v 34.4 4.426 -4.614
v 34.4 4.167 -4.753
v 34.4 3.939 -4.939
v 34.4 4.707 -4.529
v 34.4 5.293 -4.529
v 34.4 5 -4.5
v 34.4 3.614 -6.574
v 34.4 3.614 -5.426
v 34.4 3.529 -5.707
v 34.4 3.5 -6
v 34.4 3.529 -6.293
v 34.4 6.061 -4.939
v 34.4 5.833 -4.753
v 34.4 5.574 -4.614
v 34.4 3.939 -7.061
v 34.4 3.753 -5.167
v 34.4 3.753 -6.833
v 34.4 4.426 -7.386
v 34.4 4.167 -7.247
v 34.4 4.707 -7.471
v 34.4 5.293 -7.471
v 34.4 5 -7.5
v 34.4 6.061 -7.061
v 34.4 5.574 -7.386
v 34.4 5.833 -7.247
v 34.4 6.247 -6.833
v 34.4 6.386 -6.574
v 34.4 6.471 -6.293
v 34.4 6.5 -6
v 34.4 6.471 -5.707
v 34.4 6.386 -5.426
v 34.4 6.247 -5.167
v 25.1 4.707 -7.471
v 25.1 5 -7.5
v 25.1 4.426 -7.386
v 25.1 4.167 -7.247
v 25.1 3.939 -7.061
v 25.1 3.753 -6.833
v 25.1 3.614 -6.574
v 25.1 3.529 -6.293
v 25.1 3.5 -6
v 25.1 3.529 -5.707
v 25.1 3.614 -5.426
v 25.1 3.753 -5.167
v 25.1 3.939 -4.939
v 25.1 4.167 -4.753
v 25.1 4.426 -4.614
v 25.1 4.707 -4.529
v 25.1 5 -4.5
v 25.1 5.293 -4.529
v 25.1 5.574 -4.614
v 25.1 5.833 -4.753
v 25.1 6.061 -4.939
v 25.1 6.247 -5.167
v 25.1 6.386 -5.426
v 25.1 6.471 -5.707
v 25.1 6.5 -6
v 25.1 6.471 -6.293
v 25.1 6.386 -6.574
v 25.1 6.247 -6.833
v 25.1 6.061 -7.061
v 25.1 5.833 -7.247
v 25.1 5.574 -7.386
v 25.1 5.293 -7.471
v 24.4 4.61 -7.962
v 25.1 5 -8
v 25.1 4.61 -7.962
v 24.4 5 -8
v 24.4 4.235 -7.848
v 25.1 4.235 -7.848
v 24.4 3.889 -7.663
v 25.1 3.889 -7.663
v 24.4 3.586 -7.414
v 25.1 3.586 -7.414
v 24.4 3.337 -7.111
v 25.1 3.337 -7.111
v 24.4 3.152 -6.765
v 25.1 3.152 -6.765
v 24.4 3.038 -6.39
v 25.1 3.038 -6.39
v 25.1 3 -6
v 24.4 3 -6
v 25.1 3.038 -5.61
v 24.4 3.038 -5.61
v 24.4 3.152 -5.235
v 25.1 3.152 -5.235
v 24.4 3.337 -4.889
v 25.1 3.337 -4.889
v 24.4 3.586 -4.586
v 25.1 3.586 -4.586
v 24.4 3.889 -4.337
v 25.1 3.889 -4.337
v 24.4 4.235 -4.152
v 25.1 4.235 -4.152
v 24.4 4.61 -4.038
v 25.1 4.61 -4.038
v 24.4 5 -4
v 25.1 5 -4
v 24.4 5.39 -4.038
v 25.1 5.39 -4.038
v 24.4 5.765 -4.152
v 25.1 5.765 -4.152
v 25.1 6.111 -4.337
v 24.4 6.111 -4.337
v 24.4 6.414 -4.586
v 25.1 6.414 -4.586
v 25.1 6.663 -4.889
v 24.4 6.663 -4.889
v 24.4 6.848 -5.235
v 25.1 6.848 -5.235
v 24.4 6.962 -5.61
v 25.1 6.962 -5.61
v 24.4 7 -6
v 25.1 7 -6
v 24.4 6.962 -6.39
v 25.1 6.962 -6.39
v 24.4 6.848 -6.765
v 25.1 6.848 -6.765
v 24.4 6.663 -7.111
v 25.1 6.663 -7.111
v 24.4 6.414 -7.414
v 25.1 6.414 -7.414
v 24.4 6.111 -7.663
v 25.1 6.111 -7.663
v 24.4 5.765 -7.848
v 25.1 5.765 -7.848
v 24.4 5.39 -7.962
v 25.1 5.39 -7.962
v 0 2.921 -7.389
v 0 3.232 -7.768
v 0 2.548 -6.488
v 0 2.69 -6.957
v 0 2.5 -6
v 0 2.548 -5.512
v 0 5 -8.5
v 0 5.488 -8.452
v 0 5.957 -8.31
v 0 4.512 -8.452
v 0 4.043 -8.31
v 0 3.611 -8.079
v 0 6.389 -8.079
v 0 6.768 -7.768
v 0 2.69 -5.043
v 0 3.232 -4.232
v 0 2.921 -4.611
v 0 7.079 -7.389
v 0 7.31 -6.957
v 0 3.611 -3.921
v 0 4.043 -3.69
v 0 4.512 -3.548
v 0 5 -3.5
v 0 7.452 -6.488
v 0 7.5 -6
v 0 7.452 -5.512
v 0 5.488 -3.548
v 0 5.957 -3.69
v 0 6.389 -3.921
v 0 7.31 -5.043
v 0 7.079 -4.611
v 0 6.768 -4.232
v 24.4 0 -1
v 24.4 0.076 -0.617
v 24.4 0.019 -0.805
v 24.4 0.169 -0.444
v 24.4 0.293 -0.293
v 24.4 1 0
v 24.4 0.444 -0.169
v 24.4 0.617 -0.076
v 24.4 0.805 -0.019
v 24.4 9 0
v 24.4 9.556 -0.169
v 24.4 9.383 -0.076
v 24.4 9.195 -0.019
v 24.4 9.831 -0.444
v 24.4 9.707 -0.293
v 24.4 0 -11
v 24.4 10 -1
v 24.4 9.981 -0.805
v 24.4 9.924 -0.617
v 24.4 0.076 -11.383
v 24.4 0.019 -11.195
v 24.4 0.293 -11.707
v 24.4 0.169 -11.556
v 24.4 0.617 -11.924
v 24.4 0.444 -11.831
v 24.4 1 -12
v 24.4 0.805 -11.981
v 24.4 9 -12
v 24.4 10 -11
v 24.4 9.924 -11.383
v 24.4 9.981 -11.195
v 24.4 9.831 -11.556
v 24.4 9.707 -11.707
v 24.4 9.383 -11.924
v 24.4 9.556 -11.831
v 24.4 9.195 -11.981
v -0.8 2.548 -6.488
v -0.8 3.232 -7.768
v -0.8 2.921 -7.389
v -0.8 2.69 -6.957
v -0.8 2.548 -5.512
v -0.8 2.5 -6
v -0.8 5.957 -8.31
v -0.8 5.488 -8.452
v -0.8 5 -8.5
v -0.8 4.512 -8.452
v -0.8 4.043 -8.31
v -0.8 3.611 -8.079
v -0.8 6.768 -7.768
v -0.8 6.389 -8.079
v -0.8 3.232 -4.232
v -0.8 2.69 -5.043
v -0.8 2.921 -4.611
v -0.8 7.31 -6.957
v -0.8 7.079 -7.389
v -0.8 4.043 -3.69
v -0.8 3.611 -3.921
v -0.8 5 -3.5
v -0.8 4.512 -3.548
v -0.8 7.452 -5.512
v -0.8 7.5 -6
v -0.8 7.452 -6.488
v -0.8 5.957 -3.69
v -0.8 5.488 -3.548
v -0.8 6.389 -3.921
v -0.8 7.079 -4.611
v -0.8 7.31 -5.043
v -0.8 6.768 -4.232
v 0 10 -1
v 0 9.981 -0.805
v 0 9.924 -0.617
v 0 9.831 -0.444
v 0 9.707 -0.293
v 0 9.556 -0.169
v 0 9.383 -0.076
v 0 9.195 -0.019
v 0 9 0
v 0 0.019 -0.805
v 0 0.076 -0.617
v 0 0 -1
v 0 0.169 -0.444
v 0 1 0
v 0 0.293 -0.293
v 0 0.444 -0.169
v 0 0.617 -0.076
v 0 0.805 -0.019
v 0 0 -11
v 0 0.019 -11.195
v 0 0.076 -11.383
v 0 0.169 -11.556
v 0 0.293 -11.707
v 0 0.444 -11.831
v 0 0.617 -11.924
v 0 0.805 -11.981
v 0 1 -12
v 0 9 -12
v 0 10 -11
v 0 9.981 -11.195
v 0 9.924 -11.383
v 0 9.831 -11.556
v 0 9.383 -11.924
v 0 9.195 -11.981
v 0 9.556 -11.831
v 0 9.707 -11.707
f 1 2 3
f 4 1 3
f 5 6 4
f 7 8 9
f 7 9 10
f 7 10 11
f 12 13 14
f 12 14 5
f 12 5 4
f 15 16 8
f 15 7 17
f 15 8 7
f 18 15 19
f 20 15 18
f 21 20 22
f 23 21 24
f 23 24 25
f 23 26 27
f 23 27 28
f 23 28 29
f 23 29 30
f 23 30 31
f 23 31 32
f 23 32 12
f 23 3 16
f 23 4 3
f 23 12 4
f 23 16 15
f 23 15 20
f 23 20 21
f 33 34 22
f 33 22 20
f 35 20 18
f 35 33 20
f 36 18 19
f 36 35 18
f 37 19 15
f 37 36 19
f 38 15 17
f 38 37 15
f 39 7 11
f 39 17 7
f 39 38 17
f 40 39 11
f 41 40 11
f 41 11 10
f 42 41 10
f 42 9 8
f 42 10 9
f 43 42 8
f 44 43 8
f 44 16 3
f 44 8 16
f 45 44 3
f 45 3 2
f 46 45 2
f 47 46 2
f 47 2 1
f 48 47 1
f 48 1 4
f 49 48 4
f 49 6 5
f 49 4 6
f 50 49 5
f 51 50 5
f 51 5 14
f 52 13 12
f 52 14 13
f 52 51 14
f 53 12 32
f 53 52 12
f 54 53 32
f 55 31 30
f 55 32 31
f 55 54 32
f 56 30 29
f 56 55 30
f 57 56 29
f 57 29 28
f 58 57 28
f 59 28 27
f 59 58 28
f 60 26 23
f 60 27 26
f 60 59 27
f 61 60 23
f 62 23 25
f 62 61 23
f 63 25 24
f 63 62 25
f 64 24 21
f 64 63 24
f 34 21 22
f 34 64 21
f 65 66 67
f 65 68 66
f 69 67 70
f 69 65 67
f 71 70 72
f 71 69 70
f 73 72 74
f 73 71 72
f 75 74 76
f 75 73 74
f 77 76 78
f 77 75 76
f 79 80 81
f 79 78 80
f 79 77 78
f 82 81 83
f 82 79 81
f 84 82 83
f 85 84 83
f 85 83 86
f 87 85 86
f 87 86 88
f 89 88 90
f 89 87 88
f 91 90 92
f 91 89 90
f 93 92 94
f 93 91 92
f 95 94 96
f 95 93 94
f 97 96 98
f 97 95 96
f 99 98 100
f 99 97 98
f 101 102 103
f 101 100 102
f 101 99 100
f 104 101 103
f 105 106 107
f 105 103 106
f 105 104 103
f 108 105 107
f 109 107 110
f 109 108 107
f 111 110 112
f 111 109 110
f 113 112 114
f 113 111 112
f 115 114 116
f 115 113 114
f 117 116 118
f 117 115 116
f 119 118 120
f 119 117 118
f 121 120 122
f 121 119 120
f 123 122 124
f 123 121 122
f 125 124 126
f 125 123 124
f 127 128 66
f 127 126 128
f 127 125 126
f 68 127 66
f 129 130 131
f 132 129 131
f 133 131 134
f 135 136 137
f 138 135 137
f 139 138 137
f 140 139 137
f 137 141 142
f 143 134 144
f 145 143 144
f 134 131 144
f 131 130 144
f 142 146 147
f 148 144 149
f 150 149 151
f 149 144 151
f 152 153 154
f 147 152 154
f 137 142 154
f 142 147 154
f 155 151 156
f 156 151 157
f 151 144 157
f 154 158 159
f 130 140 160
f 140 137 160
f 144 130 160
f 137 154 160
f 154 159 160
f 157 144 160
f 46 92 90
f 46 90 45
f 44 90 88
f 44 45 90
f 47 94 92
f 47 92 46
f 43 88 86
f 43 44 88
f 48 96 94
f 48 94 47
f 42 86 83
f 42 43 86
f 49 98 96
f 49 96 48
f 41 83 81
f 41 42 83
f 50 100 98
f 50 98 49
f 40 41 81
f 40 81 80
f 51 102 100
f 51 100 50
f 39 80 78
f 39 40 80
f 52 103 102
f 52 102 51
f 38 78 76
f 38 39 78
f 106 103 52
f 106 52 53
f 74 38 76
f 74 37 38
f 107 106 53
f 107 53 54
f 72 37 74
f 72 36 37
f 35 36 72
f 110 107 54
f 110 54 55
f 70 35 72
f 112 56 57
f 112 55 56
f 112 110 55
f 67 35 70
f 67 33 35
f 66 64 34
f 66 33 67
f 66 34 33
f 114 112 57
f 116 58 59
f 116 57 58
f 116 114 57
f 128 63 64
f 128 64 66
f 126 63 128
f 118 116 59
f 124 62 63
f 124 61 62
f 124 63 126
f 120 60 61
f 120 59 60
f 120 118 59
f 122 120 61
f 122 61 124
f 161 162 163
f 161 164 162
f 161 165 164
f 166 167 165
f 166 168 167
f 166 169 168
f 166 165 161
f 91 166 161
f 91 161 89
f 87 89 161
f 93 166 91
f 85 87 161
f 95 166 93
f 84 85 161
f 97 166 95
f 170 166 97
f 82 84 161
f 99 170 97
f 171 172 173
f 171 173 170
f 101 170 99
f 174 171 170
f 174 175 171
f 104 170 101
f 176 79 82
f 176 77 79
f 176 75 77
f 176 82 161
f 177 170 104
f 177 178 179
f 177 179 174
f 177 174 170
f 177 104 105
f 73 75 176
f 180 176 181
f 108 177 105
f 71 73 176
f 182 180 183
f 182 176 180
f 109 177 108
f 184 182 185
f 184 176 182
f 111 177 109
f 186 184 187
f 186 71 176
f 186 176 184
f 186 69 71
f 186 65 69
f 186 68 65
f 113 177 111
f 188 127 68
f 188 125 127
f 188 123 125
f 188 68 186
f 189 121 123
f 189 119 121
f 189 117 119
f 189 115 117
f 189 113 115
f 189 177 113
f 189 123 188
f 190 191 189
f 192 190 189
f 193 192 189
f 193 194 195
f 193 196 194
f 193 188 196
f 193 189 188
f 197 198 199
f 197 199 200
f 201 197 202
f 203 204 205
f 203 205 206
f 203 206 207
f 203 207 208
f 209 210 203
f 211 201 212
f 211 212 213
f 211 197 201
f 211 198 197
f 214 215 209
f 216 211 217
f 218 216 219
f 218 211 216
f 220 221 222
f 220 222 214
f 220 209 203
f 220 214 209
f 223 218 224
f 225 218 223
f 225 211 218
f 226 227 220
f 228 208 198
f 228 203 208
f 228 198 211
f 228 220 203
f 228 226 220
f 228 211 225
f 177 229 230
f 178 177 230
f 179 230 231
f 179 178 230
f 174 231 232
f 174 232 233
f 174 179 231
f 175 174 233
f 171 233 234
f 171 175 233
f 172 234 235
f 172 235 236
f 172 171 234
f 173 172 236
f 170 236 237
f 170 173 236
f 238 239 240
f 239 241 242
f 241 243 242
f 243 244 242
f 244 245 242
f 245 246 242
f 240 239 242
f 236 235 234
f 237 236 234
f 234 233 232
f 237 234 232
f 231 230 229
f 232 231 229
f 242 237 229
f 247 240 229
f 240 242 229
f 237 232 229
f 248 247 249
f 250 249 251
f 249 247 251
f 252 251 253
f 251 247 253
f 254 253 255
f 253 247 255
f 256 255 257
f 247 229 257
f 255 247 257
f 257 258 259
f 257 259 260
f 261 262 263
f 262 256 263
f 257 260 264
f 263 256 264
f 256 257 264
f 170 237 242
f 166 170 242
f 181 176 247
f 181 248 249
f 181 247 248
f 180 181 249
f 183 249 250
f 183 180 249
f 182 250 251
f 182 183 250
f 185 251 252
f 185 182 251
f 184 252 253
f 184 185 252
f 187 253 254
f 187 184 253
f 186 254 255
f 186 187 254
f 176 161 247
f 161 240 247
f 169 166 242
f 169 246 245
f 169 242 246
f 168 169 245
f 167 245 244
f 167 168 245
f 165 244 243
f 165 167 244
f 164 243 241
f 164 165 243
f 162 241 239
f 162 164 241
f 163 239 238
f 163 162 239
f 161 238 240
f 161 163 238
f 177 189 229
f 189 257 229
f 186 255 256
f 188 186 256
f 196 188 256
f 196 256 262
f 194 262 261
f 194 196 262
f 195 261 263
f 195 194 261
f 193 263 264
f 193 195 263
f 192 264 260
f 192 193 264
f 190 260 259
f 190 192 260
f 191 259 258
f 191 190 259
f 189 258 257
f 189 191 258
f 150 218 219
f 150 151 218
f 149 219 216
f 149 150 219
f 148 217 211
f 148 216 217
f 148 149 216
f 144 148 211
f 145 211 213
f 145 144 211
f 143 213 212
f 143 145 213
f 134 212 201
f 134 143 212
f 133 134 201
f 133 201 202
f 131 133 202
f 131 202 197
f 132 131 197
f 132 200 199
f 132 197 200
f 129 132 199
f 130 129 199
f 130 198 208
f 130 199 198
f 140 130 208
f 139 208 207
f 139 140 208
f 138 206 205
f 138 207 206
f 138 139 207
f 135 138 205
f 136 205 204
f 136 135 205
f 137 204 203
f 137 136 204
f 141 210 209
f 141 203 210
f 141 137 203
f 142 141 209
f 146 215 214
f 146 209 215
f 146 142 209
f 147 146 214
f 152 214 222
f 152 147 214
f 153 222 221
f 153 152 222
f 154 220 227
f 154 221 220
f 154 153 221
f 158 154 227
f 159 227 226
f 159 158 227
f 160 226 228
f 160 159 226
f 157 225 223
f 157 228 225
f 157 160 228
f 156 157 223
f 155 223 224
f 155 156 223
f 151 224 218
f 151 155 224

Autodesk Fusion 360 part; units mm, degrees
sketch "スケッチ1" plane through (0, 0, 0) normal (1, 0, 0) x (0, 0, -1)
  line L0 (0, 0) -> (12, 0)
  line L1 (12, 0) -> (12, 10)
  line L2 (12, 10) -> (0, 10)
  line L3 (0, 10) -> (0, 0)
  dimension "d1" = 10
  dimension "d2" = 12
extrude "押し出し1" add sketch "スケッチ1" along normal blind 24.4 makes body 1
fillet "フィレット1" radius 1 1 edges at (12.2, 10, -12) on bodies 1
fillet "フィレット2" radius 1 1 edges at (12.2, 10, 0) on bodies 1
fillet "フィレット3" radius 1 1 edges at (12.2, 0, -12) on bodies 1
fillet "フィレット4" radius 1 1 edges at (12.2, 0, 0) on bodies 1
sketch "スケッチ2" plane through (24.4, 0, 0) normal (1, 0, 0) x (0, 0, -1)
  arc A0 (0, 1) -> (1, 0) centre (1, 1) ccw
  line L0 (1, 0) -> (11, 0)
  arc A1 (11, 0) -> (12, 1) centre (11, 1) ccw
  line L1 (12, 1) -> (12, 9)
  arc A2 (12, 9) -> (11, 10) centre (11, 9) ccw
  line L2 (11, 10) -> (1, 10)
  arc A3 (1, 10) -> (0, 9) centre (1, 9) ccw
  line L3 (0, 9) -> (0, 1)
  circle A4 centre (6, 5) radius 2
  dimension "d18" = 2
extrude "押し出し2" add sketch "スケッチ2" along normal blind 0.7 contours A4 bodies 1
sketch "スケッチ3" plane through (25.1, 0, 0) normal (1, 0, 0) x (0, 0, -1)
  circle A0 centre (6, 5) radius 2
  circle A1 centre (6, 5) radius 1.5
  dimension "d12" = 3
extrude "押し出し3" add sketch "スケッチ3" along normal blind 9.3 contours A1 bodies 1
sketch "スケッチ4" plane through (0, 0, 0) normal (-1, 0, 0) x (0, 0, 1)
  arc A0 (-1, 0) -> (0, 1) centre (-1, 1) ccw
  line L0 (0, 1) -> (0, 9)
  arc A1 (0, 9) -> (-1, 10) centre (-1, 9) ccw
  line L1 (-1, 10) -> (-11, 10)
  arc A2 (-11, 10) -> (-12, 9) centre (-11, 9) ccw
  line L2 (-12, 9) -> (-12, 1)
  arc A3 (-12, 1) -> (-11, 0) centre (-11, 1) ccw
  line L3 (-11, 0) -> (-1, 0)
  circle A4 centre (-6, 5) radius 2.5
  dimension "d15" = 5
extrude "押し出し1'" add sketch "スケッチ4" along normal blind 0.8 separate body contours A4 makes body 2 in component "Component"
component "Component" placed x (1, 0, 0) y (0, 1, 0) z (0, 0, 1) at (0, 0, 0)
